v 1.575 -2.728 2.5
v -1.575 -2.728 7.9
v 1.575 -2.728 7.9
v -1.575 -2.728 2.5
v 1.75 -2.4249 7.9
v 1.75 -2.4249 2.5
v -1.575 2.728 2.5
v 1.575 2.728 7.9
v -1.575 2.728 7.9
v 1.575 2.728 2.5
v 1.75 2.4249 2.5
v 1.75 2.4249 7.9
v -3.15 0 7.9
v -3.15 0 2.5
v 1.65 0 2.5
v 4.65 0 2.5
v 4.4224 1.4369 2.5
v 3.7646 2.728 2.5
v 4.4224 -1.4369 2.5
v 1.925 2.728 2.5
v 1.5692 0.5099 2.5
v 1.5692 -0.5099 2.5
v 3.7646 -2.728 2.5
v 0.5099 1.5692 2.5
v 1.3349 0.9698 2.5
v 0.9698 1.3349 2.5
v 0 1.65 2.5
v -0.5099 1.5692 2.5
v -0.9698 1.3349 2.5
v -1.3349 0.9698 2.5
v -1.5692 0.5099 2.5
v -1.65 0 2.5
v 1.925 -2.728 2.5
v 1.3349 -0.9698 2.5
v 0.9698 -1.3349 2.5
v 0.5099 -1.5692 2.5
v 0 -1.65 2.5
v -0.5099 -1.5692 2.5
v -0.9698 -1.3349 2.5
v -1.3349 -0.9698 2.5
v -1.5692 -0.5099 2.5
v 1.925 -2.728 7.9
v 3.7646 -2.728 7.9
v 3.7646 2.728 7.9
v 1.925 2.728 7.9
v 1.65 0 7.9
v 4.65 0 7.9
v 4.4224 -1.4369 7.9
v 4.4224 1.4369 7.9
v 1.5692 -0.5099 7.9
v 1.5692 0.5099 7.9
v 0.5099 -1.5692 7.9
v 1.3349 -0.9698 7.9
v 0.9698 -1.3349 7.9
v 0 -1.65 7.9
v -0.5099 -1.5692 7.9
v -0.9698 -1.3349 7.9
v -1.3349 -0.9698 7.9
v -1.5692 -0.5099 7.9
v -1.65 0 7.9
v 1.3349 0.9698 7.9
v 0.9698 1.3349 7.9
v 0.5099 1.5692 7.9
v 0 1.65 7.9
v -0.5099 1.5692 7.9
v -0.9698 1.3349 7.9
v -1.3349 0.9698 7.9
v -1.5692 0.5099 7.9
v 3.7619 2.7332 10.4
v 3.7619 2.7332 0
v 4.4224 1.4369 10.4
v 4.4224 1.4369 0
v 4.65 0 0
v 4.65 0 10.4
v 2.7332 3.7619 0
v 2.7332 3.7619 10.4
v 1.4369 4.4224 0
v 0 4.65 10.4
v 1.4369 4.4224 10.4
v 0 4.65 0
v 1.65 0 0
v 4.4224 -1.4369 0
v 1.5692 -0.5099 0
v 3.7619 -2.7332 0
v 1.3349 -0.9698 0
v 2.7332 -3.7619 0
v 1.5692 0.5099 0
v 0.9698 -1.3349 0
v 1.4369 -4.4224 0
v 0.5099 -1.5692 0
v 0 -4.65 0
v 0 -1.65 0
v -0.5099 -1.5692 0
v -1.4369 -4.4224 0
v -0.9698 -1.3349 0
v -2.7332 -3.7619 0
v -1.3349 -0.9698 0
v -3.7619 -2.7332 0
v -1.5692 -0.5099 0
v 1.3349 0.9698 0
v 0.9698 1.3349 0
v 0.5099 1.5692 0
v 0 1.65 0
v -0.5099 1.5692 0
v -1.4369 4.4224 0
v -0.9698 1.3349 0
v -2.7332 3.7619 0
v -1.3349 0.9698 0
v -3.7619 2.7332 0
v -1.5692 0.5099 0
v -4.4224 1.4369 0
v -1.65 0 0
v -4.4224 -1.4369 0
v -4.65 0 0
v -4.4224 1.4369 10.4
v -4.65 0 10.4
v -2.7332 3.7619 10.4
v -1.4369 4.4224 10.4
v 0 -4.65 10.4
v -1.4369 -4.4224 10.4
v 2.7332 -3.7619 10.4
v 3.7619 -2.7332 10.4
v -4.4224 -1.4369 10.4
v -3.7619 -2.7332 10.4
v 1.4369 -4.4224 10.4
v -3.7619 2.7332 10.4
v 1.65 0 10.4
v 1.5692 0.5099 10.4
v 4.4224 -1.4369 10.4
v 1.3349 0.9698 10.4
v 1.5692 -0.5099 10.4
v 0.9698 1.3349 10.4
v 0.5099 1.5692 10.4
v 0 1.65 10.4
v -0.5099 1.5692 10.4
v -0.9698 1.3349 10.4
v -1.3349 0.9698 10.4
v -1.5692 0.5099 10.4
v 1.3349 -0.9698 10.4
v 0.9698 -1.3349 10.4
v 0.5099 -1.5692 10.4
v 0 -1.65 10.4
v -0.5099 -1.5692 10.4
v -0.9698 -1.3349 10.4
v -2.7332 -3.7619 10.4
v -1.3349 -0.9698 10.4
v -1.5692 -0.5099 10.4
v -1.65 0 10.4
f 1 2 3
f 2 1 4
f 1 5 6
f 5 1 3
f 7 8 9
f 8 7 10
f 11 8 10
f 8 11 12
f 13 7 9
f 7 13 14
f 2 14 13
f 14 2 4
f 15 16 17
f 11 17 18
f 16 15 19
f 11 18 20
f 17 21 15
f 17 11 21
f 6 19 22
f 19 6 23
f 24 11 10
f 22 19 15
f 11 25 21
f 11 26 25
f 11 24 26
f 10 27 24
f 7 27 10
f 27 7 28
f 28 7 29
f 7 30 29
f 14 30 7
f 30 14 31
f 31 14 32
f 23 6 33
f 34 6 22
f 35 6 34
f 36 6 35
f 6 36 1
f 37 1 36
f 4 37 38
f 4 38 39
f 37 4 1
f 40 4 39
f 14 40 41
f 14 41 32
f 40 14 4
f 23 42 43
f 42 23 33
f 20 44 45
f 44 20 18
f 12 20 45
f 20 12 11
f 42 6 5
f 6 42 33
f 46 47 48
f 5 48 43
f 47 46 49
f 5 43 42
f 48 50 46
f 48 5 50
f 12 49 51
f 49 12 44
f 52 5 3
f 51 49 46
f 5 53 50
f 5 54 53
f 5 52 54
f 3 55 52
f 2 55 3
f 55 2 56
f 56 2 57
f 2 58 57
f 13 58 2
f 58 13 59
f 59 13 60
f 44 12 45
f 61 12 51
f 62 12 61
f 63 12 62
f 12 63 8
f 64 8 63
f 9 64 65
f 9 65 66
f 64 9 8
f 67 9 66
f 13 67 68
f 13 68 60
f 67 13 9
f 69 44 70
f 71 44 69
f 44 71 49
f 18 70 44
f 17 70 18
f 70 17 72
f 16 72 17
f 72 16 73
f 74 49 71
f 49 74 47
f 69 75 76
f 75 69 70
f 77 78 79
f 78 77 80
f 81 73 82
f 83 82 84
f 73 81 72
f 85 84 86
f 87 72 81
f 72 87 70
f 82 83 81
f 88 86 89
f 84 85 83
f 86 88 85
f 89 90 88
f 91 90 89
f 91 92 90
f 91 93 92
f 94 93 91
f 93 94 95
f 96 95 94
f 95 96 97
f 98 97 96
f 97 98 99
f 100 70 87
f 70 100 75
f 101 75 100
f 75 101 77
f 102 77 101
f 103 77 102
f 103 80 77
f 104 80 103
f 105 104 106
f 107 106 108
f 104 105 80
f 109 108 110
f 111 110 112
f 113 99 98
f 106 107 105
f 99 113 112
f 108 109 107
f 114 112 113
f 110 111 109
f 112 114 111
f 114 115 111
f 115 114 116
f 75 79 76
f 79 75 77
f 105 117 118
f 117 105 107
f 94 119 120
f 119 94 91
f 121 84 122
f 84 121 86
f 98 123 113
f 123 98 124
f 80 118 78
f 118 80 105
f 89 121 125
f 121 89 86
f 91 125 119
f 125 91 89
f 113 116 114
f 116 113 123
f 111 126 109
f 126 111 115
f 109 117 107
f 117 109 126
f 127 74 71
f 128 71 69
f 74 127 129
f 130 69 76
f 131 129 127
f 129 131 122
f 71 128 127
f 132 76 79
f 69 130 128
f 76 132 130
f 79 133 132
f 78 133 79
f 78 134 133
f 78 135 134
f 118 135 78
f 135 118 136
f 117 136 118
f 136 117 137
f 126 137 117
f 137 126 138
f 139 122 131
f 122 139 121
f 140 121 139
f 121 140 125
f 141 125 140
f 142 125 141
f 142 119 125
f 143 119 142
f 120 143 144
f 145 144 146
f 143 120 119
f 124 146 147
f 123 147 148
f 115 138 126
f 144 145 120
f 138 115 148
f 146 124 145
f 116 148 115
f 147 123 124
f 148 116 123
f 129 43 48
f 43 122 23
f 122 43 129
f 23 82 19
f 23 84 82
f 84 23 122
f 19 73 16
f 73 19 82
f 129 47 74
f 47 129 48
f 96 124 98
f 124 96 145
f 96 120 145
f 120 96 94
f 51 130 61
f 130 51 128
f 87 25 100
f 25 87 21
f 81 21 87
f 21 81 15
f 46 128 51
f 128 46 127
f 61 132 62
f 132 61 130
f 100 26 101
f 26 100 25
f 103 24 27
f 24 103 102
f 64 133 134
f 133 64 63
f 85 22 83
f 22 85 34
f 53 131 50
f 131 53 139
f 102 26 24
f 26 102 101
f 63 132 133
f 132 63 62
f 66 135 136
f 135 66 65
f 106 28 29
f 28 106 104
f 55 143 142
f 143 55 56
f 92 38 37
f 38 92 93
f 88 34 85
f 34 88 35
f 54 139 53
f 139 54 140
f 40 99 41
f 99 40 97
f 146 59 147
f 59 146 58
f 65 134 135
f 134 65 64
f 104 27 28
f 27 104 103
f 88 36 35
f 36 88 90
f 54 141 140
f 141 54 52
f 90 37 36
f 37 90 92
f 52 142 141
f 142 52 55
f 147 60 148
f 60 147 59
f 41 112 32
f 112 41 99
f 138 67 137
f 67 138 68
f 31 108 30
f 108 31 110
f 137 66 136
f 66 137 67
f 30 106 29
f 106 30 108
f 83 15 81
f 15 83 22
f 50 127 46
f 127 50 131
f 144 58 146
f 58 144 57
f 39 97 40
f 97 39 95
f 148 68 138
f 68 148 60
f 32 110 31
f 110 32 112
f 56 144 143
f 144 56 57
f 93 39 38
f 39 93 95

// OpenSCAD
$fn = 20;
eps = 0.3;
l = 5;
s = 1.5;
nut_dia = 6.0;
nut_h = 2.4+eps;
sr = (3+eps)/2;

r = (nut_dia + eps) / 2;
or = r + s;
h = l + 2* nut_h;
difference(){
    cylinder(h,or,or);
    cylinder(h,sr,sr);
    translate([0,0,h/2-nut_h]) {cylinder(nut_h+0.1,r,r, $fn=6); translate([r/0.9,0,0]) cylinder(nut_h+0.1,r,r, $fn=6);} 
    translate([0,0,h/2]){ cylinder(nut_h,r,r, $fn=6); translate([r/0.9,0,0]) cylinder(nut_h,r,r, $fn=6);} 
}
